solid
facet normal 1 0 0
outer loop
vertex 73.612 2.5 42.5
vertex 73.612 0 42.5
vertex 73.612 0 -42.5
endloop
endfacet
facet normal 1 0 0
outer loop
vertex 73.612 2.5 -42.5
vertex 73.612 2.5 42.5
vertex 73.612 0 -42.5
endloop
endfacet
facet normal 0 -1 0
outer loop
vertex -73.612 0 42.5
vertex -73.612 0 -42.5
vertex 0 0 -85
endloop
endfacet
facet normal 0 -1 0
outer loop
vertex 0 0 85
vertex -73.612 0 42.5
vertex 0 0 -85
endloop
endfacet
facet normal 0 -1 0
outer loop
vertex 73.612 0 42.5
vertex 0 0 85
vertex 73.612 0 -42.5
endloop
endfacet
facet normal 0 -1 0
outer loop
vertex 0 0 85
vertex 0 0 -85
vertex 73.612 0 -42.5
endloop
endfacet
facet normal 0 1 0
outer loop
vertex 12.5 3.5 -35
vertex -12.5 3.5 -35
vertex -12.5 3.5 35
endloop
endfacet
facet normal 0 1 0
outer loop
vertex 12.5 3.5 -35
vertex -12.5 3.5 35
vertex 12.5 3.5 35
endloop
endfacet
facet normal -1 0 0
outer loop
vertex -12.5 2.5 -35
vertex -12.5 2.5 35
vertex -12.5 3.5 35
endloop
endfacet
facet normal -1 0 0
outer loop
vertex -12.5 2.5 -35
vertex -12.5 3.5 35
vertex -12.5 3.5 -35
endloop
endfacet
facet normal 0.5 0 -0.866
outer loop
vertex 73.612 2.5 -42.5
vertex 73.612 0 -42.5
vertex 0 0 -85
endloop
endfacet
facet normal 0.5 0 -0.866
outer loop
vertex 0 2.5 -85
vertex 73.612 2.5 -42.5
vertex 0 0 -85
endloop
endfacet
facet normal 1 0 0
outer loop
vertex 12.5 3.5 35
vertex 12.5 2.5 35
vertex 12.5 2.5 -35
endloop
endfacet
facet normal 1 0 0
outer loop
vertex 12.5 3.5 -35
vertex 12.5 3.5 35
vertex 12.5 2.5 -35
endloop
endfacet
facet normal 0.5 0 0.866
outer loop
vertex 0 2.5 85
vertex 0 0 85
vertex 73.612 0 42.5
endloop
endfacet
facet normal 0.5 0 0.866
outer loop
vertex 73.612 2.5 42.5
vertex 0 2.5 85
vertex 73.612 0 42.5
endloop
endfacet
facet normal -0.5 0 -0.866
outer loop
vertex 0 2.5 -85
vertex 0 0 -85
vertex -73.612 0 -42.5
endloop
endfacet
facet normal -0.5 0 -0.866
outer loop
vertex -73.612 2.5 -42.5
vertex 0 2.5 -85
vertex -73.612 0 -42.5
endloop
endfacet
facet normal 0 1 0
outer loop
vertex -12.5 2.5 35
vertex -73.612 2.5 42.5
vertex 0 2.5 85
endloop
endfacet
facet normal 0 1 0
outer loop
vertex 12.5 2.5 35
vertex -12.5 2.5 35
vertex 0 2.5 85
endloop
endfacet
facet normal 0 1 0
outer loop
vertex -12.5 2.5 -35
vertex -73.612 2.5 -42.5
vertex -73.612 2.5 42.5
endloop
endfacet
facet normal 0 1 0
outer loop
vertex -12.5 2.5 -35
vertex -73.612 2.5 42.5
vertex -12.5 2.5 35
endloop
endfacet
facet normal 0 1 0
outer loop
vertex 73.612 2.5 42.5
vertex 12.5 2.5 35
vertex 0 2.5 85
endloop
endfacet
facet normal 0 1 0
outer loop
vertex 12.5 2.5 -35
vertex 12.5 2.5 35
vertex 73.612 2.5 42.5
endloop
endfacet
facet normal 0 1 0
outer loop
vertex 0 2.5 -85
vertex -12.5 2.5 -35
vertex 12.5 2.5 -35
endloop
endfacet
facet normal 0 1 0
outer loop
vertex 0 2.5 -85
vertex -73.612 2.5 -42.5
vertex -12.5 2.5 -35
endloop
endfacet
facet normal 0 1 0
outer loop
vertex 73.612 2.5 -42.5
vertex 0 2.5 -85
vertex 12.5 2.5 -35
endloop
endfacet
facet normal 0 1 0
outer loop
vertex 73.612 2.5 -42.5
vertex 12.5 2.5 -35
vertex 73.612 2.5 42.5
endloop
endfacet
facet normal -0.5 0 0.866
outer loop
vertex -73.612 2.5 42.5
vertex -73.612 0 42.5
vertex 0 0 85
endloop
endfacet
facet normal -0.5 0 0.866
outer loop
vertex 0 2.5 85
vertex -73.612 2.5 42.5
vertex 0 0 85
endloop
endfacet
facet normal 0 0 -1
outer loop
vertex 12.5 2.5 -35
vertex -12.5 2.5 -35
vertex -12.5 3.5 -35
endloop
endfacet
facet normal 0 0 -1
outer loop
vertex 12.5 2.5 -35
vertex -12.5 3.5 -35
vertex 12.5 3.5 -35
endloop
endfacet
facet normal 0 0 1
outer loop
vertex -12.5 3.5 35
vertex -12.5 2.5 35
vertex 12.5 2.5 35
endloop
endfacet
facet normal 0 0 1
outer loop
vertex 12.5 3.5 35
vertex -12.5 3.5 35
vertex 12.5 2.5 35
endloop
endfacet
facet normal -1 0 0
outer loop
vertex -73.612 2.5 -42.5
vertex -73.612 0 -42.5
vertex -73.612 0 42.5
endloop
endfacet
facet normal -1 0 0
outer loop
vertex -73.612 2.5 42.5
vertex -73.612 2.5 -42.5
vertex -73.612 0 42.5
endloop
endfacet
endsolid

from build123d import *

# Parameters (mm, degrees)
BOSS_EXTRUDE1_DEPTH = 2.5
SKETCH2_W           = 25
SKETCH2_H           = 70
BOSS_EXTRUDE2_DEPTH = 1


with BuildPart() as part:
    # Sketch1 → Boss-Extrude1 (new body)
    with BuildSketch(Plane(origin=(0, 0, 0), x_dir=(1, 0, 0), z_dir=(0, 1, 0))):
        Polygon((73.612159322, 42.5), (0, 85), (-73.612159322, 42.5), (-73.612159322, -42.5), (0, -85), (73.612159322, -42.5), align=None)
    extrude(amount=BOSS_EXTRUDE1_DEPTH)

    # Sketch2 → Boss-Extrude2 (add)
    with BuildSketch(Plane(origin=(0, 2.5, 0), x_dir=(1, 0, 0), z_dir=(0, 1, 0))):
        Rectangle(SKETCH2_W, SKETCH2_H)
    extrude(amount=BOSS_EXTRUDE2_DEPTH)


solid = part.part
